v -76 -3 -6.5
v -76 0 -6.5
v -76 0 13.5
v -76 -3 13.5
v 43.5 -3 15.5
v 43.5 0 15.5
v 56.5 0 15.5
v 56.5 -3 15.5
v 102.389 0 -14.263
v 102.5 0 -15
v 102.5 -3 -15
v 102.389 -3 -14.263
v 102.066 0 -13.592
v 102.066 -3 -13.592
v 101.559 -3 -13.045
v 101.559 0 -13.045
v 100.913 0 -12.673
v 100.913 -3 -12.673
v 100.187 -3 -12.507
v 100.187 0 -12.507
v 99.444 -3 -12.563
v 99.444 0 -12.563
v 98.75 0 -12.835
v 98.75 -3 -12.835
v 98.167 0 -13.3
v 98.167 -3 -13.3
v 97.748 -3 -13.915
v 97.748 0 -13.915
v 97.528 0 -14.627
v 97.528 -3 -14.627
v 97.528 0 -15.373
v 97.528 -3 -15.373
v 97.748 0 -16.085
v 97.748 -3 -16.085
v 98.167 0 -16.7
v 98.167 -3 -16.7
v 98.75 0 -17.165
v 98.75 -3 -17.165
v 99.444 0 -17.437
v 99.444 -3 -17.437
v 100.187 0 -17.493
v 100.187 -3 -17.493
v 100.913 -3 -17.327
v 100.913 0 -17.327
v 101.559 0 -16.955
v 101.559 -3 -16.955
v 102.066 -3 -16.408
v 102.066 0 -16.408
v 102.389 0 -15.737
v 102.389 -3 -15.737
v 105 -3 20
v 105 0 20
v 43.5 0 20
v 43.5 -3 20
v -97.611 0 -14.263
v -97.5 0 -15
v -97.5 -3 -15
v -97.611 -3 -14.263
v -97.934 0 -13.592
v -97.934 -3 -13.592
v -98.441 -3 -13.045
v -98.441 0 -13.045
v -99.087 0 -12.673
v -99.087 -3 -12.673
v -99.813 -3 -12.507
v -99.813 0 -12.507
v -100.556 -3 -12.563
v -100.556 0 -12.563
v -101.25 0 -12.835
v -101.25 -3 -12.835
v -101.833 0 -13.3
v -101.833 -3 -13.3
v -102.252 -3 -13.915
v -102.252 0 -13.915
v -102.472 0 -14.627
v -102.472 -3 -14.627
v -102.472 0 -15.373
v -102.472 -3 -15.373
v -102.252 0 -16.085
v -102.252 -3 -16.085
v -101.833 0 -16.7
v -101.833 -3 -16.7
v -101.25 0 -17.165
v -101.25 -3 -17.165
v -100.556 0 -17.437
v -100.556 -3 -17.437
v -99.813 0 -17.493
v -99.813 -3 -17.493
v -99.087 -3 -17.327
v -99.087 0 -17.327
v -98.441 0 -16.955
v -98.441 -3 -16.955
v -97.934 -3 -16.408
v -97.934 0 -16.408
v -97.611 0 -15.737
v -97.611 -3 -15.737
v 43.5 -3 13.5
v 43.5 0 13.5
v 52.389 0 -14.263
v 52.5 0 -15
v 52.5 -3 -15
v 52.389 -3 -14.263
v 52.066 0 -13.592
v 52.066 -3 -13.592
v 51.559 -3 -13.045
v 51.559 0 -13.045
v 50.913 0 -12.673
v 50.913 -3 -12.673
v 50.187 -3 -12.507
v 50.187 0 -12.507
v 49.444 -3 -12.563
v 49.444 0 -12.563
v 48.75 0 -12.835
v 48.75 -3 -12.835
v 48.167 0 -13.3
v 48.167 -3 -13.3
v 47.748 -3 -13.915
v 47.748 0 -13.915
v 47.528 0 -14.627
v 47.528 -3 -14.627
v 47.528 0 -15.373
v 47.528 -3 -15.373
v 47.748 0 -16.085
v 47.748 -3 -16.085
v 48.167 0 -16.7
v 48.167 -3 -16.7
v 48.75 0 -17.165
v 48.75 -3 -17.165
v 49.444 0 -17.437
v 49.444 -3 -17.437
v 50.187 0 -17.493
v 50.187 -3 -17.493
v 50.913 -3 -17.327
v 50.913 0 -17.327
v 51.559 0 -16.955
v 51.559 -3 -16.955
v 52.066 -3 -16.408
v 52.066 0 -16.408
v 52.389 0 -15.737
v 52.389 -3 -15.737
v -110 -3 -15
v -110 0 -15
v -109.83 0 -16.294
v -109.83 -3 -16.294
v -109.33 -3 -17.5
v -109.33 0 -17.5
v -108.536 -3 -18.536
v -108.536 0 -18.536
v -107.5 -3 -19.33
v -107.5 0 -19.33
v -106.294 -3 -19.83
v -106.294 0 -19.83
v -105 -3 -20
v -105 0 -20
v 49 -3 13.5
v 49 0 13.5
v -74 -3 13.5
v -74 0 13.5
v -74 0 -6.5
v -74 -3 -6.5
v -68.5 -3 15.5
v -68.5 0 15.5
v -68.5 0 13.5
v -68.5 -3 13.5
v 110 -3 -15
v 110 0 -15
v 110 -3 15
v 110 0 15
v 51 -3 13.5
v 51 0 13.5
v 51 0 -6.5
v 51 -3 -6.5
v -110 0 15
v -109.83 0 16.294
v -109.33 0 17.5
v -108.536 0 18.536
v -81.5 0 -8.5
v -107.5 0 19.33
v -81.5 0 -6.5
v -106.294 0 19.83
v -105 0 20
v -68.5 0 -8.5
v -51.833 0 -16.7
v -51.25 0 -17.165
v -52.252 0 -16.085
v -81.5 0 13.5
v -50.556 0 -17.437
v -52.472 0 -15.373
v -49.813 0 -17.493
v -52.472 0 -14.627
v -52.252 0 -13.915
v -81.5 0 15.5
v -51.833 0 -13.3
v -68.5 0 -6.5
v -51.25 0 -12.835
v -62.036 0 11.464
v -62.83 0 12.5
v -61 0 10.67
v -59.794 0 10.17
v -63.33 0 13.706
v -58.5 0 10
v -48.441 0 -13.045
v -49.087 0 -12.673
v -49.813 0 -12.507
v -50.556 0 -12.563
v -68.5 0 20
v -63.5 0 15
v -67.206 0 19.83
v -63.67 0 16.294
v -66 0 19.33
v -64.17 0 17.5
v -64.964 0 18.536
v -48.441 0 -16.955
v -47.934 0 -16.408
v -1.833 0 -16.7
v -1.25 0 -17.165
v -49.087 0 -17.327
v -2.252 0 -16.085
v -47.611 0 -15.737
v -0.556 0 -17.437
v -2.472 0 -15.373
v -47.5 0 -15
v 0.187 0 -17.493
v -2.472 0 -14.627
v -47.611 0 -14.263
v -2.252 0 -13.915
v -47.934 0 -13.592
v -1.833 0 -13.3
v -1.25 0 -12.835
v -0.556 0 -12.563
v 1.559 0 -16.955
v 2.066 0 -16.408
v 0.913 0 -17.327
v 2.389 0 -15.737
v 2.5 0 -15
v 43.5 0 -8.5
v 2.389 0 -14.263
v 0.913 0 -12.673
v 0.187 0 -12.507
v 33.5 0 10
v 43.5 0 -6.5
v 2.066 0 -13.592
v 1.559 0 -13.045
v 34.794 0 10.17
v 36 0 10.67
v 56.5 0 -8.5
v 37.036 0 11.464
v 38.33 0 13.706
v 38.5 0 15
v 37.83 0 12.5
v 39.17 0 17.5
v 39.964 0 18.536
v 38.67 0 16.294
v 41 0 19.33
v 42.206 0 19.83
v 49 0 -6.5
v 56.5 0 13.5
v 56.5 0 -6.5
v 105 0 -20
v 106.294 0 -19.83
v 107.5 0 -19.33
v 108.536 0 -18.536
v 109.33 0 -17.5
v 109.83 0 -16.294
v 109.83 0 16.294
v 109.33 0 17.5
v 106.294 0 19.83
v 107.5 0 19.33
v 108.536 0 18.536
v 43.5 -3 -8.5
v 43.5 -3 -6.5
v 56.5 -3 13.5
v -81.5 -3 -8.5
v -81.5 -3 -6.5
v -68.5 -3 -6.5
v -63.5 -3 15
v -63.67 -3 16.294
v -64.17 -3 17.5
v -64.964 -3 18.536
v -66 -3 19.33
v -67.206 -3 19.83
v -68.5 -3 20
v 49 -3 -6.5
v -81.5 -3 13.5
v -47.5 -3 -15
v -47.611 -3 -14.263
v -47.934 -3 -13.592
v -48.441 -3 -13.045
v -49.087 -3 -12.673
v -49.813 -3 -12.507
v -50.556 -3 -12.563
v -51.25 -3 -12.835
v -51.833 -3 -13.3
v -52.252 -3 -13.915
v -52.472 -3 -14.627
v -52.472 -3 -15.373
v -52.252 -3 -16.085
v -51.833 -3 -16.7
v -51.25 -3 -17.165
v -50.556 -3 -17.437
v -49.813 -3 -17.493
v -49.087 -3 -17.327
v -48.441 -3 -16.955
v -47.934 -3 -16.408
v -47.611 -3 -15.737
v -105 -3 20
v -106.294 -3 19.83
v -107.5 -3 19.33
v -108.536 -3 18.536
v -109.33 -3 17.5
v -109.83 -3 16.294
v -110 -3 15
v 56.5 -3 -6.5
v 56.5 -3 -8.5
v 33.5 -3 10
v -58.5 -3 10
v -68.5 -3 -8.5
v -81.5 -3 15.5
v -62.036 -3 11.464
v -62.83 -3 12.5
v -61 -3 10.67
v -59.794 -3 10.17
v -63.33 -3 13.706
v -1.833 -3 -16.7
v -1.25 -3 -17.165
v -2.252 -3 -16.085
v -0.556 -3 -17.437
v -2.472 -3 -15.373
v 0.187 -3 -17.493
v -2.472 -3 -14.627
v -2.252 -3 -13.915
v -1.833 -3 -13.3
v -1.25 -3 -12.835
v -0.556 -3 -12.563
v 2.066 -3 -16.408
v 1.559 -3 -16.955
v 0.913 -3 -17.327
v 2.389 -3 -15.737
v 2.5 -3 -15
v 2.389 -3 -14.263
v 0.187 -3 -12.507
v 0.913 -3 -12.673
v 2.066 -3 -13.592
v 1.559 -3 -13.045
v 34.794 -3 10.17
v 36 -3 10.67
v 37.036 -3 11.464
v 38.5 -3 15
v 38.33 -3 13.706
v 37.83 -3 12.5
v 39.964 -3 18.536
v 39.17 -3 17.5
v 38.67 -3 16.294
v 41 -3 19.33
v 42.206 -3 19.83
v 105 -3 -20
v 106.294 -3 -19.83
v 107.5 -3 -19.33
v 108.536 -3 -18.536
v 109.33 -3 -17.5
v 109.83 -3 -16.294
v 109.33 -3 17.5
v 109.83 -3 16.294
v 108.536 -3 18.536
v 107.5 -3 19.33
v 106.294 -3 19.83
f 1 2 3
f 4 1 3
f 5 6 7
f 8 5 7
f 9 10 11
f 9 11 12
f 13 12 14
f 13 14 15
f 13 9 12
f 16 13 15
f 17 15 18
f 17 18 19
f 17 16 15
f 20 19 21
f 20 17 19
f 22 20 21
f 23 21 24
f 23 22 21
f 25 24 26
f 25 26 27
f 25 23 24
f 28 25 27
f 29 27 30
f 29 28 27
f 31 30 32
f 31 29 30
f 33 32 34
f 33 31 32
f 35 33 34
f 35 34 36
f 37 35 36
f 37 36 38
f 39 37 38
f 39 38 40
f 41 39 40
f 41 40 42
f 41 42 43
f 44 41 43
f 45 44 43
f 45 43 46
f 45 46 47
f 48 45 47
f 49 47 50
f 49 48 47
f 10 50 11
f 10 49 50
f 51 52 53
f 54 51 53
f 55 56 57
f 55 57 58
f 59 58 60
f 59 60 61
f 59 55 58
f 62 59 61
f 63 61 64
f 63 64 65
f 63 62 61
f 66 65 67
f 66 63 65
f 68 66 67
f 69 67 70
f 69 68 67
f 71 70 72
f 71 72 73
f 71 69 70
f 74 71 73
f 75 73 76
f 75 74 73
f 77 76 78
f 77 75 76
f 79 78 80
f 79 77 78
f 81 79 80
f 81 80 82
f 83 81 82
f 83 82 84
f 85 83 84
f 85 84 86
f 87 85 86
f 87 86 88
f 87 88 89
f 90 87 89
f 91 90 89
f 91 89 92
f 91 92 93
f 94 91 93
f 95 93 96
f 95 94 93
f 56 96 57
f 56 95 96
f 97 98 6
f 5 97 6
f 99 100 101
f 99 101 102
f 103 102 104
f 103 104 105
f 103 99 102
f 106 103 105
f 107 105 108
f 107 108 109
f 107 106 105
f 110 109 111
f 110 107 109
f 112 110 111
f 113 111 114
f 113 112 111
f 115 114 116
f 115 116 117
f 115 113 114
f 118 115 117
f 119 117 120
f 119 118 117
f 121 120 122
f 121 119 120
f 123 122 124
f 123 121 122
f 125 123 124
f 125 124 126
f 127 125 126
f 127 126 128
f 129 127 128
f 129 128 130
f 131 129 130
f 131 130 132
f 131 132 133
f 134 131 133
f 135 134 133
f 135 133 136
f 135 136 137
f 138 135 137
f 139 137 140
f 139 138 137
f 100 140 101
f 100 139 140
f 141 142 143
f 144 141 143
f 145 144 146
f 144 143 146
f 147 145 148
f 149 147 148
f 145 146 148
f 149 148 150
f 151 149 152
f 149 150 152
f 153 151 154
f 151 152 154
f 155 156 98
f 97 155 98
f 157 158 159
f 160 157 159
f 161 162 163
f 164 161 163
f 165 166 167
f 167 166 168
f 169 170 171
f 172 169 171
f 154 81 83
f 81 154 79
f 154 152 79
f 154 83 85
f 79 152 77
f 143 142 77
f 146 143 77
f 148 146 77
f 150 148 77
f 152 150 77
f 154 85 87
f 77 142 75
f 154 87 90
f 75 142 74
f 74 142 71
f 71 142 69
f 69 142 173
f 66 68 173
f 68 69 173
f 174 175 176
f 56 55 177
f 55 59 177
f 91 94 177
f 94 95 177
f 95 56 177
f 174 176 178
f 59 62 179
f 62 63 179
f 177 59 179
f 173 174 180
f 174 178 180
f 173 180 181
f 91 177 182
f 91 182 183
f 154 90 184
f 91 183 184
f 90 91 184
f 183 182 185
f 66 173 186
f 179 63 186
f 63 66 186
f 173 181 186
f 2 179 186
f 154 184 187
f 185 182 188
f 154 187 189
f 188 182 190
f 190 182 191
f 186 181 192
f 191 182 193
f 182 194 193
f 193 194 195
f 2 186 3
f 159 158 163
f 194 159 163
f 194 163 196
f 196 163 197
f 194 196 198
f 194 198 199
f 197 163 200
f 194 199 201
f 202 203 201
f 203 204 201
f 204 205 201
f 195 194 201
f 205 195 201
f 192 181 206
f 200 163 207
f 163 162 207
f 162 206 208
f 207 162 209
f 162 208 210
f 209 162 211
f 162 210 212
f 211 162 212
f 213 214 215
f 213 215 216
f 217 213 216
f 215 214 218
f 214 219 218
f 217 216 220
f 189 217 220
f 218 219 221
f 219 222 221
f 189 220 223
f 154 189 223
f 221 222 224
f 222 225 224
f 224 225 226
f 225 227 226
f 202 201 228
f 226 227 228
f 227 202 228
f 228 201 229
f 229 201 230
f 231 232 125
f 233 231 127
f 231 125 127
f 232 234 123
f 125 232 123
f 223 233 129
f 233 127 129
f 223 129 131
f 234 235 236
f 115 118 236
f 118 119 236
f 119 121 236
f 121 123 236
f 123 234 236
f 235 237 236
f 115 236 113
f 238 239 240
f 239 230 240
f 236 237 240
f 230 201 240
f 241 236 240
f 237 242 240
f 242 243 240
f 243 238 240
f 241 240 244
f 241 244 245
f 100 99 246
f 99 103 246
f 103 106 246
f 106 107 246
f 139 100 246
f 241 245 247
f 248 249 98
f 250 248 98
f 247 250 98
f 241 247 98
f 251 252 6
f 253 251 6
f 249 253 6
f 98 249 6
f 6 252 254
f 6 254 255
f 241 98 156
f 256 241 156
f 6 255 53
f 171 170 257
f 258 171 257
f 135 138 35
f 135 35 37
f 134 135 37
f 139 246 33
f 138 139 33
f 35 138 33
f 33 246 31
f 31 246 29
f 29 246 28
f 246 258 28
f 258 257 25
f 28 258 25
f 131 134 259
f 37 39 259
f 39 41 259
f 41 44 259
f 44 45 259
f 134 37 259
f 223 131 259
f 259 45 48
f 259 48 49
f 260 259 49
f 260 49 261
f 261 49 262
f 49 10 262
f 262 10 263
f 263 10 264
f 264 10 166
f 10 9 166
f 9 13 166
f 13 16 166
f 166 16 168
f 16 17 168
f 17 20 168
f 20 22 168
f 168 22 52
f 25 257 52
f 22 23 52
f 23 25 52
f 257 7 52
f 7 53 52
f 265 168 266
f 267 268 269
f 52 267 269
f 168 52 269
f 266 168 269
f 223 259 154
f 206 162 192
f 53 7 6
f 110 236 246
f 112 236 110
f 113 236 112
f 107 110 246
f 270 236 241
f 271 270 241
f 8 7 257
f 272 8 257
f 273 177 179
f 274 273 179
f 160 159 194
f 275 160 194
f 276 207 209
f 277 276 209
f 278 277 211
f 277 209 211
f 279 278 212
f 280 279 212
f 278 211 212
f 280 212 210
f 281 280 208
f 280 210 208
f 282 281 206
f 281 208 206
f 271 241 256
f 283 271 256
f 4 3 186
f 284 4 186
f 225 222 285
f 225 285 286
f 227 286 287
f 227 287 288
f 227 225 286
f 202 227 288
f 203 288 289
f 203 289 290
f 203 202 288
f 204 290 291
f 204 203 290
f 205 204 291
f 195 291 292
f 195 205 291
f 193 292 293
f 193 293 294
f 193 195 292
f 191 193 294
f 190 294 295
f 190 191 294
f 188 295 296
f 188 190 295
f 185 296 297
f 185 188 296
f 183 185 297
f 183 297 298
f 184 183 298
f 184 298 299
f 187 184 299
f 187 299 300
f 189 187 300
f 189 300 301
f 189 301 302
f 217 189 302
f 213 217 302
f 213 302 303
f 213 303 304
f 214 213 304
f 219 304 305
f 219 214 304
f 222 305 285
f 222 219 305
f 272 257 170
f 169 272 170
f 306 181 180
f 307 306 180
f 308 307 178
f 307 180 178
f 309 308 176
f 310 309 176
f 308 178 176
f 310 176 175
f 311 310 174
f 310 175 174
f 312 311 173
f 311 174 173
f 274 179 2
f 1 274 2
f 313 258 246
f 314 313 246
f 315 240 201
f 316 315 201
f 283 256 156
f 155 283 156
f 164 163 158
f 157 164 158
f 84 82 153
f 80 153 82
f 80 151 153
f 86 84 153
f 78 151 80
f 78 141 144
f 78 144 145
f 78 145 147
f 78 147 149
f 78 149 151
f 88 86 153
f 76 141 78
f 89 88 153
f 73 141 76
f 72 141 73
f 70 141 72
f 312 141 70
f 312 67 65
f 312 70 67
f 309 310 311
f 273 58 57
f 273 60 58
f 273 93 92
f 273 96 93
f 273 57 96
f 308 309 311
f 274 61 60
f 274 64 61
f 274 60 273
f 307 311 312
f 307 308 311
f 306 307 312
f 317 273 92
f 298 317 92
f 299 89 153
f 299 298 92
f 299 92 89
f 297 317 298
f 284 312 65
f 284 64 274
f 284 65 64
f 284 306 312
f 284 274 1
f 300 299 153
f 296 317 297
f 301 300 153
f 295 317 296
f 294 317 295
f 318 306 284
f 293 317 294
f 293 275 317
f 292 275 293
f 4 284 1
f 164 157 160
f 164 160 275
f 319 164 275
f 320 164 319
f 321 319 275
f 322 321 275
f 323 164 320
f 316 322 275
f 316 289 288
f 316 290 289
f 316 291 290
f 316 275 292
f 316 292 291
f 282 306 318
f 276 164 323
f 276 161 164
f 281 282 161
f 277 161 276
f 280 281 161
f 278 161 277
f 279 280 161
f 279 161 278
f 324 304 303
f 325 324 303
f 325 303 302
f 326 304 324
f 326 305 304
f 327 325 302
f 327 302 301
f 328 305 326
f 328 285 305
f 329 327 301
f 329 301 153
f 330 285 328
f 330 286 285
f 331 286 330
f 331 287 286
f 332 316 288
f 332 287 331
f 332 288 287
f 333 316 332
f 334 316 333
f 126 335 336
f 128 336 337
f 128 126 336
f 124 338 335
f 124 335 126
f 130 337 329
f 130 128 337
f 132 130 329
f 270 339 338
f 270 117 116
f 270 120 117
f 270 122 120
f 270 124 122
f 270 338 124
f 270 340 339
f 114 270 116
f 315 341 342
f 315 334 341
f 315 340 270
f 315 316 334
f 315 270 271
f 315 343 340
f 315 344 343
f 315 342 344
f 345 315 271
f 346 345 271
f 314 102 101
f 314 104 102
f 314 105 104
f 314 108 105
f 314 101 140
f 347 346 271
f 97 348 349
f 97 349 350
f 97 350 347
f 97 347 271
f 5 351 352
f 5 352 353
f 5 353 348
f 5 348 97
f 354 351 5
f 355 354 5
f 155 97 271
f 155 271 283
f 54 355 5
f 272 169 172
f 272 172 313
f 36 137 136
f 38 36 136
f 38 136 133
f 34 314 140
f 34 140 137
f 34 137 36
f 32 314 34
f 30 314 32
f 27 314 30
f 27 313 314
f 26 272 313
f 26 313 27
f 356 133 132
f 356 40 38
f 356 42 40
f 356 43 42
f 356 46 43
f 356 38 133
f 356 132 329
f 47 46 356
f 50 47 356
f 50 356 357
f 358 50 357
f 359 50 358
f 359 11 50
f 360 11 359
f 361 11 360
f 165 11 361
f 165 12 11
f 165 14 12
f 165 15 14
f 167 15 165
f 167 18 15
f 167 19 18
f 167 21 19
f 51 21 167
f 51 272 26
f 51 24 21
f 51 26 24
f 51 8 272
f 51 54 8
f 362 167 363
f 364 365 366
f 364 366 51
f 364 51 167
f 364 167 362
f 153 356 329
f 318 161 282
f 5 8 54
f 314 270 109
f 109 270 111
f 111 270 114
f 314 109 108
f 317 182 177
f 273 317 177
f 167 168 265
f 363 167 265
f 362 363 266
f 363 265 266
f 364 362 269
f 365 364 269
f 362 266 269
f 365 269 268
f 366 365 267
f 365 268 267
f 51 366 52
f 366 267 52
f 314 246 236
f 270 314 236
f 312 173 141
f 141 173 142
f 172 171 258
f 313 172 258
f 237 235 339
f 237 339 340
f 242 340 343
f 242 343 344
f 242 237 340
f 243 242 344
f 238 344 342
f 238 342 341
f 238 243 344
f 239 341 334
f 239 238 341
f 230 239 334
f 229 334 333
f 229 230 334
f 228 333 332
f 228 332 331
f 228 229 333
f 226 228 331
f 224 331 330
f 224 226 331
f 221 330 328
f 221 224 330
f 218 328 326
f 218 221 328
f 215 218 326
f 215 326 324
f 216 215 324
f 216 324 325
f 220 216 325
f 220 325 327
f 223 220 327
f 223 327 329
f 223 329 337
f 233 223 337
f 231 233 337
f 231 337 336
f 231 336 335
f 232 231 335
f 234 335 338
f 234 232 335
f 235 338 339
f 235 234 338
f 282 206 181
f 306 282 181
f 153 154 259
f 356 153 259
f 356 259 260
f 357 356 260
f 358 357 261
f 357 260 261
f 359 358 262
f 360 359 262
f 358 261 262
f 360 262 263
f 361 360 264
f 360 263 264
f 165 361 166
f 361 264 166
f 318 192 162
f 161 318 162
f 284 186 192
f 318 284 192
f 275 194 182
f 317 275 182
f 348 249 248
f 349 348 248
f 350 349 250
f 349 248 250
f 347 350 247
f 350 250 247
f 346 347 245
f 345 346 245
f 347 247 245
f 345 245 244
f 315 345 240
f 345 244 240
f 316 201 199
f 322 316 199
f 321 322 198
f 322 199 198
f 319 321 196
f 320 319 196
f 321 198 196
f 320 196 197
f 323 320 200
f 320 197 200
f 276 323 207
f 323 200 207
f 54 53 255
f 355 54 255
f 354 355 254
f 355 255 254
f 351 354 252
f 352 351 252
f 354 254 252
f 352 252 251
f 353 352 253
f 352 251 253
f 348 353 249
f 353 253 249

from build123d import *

# Parameters (mm, degrees)
F0_R     = 2.5
F1_DEPTH = 3


with BuildPart() as f1:
    # F0 (on Front) → F1 (new body)
    with BuildSketch(Plane.XZ):
        with BuildLine():
            Line((-68.5, 20), (-105, 20))
            ThreePointArc((-105, 20), (-108.535534, 18.535534), (-110, 15))
            Line((-110, 15), (-110, -15))
            ThreePointArc((-110, -15), (-108.535534, -18.535534), (-105, -20))
            Line((-105, -20), (105, -20))
            ThreePointArc((105, -20), (108.535534, -18.535534), (110, -15))
            Line((110, -15), (110, 15))
            ThreePointArc((110, 15), (108.535534, 18.535534), (105, 20))
            Line((105, 20), (43.5, 20))
            ThreePointArc((43.5, 20), (39.964466, 18.535534), (38.5, 15))
            ThreePointArc((38.5, 15), (37.035534, 11.464466), (33.5, 10))
            Line((33.5, 10), (-58.5, 10))
            ThreePointArc((-58.5, 10), (-62.035534, 11.464466), (-63.5, 15))
            ThreePointArc((-63.5, 15), (-64.964466, 18.535534), (-68.5, 20))
        make_face()
        with Locations((-100, -15)):
            Circle(F0_R, mode=Mode.SUBTRACT)
        with Locations((-50, -15)):
            Circle(F0_R, mode=Mode.SUBTRACT)
        with Locations((0, -15)):
            Circle(F0_R, mode=Mode.SUBTRACT)
        with Locations((50, -15)):
            Circle(F0_R, mode=Mode.SUBTRACT)
        with Locations((100, -15)):
            Circle(F0_R, mode=Mode.SUBTRACT)
        Polygon((-81.5, 13.5), (-81.5, 15.5), (-68.5, 15.5), (-68.5, 13.5), (-74, 13.5), (-74, -6.5), (-68.5, -6.5), (-68.5, -8.5), (-81.5, -8.5), (-81.5, -6.5), (-76, -6.5), (-76, 13.5), align=None, mode=Mode.SUBTRACT)
        Polygon((43.5, -6.5), (49, -6.5), (49, 13.5), (43.5, 13.5), (43.5, 15.5), (56.5, 15.5), (56.5, 13.5), (51, 13.5), (51, -6.5), (56.5, -6.5), (56.5, -8.5), (43.5, -8.5), align=None, mode=Mode.SUBTRACT)
    extrude(amount=F1_DEPTH)


solid = f1.part
